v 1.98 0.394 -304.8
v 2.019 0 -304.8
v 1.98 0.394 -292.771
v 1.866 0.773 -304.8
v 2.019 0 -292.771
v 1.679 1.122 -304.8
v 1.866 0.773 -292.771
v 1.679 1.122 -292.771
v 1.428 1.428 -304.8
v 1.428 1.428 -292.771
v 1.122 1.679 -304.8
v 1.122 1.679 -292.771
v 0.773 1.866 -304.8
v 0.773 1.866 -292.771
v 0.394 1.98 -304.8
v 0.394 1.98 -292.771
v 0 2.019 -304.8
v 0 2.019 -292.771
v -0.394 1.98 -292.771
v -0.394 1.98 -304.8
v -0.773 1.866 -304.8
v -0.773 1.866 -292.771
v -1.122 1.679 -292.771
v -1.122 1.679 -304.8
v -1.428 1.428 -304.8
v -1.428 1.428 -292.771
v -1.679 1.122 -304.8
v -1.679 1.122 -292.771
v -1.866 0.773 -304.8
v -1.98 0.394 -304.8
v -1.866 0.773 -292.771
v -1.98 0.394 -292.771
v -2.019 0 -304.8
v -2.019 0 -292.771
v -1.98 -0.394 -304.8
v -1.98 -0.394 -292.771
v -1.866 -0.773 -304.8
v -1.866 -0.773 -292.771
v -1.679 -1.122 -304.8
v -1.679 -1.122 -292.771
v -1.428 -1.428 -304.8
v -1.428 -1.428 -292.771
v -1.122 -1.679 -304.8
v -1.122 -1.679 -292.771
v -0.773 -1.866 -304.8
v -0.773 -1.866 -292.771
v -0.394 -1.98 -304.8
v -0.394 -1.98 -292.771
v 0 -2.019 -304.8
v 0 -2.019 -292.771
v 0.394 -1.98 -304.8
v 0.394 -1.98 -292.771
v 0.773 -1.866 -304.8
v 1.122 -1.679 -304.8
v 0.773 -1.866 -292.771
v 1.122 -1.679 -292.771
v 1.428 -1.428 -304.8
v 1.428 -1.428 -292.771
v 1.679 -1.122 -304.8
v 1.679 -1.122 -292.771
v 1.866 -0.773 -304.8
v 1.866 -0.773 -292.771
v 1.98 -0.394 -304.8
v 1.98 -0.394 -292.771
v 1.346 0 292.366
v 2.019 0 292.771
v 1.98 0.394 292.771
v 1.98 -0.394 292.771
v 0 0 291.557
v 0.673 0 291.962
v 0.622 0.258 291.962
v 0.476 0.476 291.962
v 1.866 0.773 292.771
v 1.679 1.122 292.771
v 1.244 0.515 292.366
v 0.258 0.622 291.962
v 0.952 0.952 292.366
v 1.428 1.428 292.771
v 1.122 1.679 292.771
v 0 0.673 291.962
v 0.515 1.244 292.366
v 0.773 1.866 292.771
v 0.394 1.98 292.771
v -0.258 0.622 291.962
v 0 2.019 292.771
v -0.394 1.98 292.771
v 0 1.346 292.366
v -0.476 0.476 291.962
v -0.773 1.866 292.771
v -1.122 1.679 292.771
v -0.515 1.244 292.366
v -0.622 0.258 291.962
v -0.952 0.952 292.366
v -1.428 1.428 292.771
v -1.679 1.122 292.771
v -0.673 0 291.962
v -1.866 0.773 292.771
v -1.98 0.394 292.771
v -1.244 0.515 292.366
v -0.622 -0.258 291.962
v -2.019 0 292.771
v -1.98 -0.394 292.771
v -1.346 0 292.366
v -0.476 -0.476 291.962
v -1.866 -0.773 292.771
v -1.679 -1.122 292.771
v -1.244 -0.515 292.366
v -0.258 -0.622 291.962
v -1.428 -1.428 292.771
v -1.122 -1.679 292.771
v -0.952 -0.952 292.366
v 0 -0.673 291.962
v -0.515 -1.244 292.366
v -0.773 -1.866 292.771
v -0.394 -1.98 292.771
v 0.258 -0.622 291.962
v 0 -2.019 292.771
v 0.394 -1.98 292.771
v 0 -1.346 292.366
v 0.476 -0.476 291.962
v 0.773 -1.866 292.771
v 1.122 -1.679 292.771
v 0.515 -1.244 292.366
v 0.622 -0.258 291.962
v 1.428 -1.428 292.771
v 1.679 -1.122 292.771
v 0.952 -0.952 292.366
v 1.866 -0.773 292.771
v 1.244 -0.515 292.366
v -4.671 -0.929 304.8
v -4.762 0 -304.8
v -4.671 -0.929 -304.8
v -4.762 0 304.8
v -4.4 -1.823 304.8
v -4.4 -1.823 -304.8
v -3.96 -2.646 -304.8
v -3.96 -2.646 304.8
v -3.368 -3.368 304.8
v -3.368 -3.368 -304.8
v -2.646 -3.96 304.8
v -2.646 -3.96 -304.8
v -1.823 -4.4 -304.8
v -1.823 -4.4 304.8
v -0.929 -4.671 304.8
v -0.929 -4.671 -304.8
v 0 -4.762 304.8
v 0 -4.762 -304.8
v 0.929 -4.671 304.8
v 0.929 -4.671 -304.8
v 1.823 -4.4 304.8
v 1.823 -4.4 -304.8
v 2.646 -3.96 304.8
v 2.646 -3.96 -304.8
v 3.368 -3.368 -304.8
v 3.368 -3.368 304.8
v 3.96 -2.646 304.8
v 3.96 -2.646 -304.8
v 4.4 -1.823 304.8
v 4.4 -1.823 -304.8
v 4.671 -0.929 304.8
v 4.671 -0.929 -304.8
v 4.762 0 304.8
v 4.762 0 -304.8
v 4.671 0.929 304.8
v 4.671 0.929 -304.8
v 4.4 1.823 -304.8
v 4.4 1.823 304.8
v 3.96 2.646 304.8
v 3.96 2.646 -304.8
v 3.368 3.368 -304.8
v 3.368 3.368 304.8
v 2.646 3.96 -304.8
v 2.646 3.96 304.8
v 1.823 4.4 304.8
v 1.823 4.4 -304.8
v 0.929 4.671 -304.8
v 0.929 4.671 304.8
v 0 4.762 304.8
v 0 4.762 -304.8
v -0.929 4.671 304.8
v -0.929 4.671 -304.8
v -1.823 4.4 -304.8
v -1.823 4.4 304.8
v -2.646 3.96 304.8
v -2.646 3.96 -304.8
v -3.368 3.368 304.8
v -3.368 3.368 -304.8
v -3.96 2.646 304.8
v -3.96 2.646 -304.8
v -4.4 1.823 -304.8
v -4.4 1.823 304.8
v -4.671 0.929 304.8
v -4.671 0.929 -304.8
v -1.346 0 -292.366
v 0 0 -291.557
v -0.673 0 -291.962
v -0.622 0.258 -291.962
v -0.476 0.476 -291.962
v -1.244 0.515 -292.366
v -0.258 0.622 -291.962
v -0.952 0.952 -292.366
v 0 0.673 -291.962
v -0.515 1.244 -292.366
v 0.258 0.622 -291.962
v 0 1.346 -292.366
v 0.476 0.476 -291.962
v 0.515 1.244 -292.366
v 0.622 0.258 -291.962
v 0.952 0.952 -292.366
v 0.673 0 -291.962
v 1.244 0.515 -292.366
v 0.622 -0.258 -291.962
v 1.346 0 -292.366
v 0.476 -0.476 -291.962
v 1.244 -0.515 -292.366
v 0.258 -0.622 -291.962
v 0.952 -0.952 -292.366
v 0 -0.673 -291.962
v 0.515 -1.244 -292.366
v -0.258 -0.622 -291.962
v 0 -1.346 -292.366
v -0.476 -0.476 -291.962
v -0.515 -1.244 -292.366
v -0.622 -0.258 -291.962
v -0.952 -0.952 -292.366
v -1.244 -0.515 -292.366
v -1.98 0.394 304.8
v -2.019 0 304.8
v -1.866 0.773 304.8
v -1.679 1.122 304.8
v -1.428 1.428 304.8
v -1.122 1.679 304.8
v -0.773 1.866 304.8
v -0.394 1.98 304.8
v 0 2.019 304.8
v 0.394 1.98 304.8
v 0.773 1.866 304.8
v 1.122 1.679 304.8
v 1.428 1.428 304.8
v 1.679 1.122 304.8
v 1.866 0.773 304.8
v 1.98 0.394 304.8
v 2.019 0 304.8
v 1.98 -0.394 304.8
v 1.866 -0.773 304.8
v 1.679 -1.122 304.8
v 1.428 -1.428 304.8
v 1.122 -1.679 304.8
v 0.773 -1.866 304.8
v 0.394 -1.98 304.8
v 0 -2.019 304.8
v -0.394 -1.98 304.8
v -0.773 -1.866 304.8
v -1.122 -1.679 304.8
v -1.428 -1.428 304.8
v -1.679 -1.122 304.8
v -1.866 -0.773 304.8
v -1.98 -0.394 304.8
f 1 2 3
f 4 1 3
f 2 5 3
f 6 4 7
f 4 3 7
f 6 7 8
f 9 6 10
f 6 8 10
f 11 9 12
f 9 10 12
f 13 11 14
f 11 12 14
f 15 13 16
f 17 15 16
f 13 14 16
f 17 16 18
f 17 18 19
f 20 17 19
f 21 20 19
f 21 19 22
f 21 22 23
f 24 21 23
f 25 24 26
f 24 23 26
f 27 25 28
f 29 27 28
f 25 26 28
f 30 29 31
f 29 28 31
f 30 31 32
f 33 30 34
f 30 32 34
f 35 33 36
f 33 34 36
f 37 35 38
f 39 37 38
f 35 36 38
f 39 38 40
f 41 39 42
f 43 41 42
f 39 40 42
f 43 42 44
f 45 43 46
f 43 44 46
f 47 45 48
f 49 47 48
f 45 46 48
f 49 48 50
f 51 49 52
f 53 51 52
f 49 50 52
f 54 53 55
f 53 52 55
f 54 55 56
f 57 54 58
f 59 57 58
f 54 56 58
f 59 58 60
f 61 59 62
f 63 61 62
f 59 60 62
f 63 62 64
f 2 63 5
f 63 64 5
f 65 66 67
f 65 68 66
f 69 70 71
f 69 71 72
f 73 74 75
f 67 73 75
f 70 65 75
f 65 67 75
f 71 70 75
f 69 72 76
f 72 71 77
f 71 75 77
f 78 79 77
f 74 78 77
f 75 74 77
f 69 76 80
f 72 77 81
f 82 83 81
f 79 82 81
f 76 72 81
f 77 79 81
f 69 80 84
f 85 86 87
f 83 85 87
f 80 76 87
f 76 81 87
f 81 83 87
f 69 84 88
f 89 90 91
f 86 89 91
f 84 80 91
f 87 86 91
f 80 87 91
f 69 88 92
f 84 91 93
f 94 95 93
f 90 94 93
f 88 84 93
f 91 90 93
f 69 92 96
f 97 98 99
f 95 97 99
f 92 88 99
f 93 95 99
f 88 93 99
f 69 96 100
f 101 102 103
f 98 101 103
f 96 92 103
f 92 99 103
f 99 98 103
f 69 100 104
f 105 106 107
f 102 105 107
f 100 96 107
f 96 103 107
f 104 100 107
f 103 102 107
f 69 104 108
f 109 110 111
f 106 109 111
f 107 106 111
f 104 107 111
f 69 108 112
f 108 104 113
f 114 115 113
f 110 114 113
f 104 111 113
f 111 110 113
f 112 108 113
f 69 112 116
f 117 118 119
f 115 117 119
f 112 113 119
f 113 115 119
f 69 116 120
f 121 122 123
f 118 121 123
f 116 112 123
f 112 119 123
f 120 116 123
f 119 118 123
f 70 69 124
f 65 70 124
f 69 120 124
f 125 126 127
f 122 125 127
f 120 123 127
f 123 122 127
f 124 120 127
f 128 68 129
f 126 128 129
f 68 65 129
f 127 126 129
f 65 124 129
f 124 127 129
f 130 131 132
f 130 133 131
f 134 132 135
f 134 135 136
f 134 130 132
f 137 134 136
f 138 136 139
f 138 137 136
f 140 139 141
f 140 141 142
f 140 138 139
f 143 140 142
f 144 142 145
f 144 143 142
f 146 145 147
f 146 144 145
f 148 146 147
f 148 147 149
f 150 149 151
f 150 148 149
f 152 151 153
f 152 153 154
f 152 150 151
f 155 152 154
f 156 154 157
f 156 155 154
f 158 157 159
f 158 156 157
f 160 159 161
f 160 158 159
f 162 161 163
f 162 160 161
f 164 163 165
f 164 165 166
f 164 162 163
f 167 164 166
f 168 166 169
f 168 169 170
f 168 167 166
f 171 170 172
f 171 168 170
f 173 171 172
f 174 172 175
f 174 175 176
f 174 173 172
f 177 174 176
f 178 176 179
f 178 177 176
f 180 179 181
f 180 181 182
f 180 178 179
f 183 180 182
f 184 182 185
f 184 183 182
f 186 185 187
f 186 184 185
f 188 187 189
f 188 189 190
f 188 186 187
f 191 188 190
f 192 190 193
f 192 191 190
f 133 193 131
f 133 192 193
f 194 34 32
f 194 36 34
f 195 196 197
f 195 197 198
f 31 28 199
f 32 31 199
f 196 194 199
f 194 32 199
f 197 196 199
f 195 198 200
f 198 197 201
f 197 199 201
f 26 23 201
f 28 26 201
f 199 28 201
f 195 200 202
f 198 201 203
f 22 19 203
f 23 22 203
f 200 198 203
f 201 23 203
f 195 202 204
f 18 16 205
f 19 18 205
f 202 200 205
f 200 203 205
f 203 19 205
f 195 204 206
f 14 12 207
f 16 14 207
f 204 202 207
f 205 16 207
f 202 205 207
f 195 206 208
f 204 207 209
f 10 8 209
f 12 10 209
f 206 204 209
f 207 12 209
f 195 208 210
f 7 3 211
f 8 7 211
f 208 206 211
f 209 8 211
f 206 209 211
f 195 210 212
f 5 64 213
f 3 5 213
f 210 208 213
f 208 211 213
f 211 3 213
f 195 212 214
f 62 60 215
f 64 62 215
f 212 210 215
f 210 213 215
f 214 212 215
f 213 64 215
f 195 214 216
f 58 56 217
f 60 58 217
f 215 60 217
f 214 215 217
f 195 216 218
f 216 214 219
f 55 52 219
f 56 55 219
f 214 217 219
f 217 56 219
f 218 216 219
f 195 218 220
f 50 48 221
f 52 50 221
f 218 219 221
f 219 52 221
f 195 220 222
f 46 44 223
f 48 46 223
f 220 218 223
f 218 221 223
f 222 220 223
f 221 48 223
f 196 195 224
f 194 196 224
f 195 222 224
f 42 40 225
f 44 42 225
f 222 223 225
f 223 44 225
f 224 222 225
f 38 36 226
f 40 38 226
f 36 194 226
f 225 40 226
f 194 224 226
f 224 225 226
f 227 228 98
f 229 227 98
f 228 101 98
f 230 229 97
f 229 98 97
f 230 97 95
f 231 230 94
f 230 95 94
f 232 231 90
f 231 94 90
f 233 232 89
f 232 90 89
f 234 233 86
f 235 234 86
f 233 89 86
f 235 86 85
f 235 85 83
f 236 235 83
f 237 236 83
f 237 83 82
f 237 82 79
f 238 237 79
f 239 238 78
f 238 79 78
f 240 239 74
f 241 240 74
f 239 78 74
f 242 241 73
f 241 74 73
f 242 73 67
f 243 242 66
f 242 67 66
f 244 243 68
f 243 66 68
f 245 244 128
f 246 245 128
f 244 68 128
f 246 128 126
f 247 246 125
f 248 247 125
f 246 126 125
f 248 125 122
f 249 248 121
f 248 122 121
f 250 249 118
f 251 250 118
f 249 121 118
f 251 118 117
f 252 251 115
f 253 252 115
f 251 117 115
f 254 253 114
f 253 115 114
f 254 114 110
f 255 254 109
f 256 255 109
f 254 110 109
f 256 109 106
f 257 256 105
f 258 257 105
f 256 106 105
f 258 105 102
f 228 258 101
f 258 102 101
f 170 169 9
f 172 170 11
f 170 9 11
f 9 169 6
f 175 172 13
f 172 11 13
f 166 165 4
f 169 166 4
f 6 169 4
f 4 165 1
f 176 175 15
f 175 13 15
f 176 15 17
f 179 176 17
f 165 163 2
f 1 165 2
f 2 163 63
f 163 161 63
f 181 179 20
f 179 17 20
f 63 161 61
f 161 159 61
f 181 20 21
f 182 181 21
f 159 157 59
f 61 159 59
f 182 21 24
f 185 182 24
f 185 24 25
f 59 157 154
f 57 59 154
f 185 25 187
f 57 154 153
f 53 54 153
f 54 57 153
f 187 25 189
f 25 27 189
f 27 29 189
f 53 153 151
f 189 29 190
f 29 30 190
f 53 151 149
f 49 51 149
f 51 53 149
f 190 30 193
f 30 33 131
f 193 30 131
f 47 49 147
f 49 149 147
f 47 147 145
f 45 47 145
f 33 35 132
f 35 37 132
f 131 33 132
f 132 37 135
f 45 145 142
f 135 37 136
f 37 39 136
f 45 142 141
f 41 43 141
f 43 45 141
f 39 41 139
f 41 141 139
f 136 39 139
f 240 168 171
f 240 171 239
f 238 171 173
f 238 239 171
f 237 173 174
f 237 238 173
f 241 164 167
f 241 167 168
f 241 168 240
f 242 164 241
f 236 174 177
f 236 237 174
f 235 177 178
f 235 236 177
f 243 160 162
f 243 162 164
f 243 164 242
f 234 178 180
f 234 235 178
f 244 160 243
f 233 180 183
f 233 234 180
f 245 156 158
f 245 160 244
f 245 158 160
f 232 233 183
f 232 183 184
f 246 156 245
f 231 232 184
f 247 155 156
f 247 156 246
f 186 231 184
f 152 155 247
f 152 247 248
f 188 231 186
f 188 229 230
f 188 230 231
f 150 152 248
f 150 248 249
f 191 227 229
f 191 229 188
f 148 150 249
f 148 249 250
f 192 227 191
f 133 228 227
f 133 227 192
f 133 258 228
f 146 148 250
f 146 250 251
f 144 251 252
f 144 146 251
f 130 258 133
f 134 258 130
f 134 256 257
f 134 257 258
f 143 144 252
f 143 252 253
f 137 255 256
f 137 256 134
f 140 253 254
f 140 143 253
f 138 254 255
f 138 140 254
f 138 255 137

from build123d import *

# Parameters (mm, degrees)
SKETCH1_R                            = 4.7625
BOSS_EXTRUDE1_DEPTH                  = 304.8
F_10_32_TAPPED_HOLE1_D               = 4.0386
F_10_32_TAPPED_HOLE1_DEPTH           = 12.02944
F_10_32_TAPPED_HOLE1_TIP             = 1.213317848
F_10_32_TAPPED_HOLE1_ON_FACE_2_D     = 4.0386
F_10_32_TAPPED_HOLE1_ON_FACE_2_DEPTH = 12.02944
F_10_32_TAPPED_HOLE1_ON_FACE_2_TIP   = 1.213317848


with BuildPart() as part:
    # Sketch1 → Boss-Extrude1 (new, symmetric)
    with BuildSketch(Plane.XY):
        with Locations(Location((0, 0, 0), (0, 0, 180))):
            Circle(SKETCH1_R)
    extrude(amount=BOSS_EXTRUDE1_DEPTH, both=True)

    # #10-32 Tapped Hole1
    with Locations(Plane(origin=(0, 0, -304.8), x_dir=(-1, 0, 0), z_dir=(0, 0, -1))):
        with Locations((0, 0)):
            Hole(F_10_32_TAPPED_HOLE1_D / 2, depth=F_10_32_TAPPED_HOLE1_DEPTH)
            with Locations((0, 0, -(F_10_32_TAPPED_HOLE1_DEPTH + F_10_32_TAPPED_HOLE1_TIP / 2))):  # 118° drill point
                Cone(0, F_10_32_TAPPED_HOLE1_D / 2, F_10_32_TAPPED_HOLE1_TIP, mode=Mode.SUBTRACT)

    # #10-32 Tapped Hole1 on face 2
    with Locations(Plane.XY.offset(304.8)):
        with Locations((0, 0)):
            Hole(F_10_32_TAPPED_HOLE1_ON_FACE_2_D / 2, depth=F_10_32_TAPPED_HOLE1_ON_FACE_2_DEPTH)
            with Locations((0, 0, -(F_10_32_TAPPED_HOLE1_ON_FACE_2_DEPTH + F_10_32_TAPPED_HOLE1_ON_FACE_2_TIP / 2))):  # 118° drill point
                Cone(0, F_10_32_TAPPED_HOLE1_ON_FACE_2_D / 2, F_10_32_TAPPED_HOLE1_ON_FACE_2_TIP, mode=Mode.SUBTRACT)


solid = part.part
